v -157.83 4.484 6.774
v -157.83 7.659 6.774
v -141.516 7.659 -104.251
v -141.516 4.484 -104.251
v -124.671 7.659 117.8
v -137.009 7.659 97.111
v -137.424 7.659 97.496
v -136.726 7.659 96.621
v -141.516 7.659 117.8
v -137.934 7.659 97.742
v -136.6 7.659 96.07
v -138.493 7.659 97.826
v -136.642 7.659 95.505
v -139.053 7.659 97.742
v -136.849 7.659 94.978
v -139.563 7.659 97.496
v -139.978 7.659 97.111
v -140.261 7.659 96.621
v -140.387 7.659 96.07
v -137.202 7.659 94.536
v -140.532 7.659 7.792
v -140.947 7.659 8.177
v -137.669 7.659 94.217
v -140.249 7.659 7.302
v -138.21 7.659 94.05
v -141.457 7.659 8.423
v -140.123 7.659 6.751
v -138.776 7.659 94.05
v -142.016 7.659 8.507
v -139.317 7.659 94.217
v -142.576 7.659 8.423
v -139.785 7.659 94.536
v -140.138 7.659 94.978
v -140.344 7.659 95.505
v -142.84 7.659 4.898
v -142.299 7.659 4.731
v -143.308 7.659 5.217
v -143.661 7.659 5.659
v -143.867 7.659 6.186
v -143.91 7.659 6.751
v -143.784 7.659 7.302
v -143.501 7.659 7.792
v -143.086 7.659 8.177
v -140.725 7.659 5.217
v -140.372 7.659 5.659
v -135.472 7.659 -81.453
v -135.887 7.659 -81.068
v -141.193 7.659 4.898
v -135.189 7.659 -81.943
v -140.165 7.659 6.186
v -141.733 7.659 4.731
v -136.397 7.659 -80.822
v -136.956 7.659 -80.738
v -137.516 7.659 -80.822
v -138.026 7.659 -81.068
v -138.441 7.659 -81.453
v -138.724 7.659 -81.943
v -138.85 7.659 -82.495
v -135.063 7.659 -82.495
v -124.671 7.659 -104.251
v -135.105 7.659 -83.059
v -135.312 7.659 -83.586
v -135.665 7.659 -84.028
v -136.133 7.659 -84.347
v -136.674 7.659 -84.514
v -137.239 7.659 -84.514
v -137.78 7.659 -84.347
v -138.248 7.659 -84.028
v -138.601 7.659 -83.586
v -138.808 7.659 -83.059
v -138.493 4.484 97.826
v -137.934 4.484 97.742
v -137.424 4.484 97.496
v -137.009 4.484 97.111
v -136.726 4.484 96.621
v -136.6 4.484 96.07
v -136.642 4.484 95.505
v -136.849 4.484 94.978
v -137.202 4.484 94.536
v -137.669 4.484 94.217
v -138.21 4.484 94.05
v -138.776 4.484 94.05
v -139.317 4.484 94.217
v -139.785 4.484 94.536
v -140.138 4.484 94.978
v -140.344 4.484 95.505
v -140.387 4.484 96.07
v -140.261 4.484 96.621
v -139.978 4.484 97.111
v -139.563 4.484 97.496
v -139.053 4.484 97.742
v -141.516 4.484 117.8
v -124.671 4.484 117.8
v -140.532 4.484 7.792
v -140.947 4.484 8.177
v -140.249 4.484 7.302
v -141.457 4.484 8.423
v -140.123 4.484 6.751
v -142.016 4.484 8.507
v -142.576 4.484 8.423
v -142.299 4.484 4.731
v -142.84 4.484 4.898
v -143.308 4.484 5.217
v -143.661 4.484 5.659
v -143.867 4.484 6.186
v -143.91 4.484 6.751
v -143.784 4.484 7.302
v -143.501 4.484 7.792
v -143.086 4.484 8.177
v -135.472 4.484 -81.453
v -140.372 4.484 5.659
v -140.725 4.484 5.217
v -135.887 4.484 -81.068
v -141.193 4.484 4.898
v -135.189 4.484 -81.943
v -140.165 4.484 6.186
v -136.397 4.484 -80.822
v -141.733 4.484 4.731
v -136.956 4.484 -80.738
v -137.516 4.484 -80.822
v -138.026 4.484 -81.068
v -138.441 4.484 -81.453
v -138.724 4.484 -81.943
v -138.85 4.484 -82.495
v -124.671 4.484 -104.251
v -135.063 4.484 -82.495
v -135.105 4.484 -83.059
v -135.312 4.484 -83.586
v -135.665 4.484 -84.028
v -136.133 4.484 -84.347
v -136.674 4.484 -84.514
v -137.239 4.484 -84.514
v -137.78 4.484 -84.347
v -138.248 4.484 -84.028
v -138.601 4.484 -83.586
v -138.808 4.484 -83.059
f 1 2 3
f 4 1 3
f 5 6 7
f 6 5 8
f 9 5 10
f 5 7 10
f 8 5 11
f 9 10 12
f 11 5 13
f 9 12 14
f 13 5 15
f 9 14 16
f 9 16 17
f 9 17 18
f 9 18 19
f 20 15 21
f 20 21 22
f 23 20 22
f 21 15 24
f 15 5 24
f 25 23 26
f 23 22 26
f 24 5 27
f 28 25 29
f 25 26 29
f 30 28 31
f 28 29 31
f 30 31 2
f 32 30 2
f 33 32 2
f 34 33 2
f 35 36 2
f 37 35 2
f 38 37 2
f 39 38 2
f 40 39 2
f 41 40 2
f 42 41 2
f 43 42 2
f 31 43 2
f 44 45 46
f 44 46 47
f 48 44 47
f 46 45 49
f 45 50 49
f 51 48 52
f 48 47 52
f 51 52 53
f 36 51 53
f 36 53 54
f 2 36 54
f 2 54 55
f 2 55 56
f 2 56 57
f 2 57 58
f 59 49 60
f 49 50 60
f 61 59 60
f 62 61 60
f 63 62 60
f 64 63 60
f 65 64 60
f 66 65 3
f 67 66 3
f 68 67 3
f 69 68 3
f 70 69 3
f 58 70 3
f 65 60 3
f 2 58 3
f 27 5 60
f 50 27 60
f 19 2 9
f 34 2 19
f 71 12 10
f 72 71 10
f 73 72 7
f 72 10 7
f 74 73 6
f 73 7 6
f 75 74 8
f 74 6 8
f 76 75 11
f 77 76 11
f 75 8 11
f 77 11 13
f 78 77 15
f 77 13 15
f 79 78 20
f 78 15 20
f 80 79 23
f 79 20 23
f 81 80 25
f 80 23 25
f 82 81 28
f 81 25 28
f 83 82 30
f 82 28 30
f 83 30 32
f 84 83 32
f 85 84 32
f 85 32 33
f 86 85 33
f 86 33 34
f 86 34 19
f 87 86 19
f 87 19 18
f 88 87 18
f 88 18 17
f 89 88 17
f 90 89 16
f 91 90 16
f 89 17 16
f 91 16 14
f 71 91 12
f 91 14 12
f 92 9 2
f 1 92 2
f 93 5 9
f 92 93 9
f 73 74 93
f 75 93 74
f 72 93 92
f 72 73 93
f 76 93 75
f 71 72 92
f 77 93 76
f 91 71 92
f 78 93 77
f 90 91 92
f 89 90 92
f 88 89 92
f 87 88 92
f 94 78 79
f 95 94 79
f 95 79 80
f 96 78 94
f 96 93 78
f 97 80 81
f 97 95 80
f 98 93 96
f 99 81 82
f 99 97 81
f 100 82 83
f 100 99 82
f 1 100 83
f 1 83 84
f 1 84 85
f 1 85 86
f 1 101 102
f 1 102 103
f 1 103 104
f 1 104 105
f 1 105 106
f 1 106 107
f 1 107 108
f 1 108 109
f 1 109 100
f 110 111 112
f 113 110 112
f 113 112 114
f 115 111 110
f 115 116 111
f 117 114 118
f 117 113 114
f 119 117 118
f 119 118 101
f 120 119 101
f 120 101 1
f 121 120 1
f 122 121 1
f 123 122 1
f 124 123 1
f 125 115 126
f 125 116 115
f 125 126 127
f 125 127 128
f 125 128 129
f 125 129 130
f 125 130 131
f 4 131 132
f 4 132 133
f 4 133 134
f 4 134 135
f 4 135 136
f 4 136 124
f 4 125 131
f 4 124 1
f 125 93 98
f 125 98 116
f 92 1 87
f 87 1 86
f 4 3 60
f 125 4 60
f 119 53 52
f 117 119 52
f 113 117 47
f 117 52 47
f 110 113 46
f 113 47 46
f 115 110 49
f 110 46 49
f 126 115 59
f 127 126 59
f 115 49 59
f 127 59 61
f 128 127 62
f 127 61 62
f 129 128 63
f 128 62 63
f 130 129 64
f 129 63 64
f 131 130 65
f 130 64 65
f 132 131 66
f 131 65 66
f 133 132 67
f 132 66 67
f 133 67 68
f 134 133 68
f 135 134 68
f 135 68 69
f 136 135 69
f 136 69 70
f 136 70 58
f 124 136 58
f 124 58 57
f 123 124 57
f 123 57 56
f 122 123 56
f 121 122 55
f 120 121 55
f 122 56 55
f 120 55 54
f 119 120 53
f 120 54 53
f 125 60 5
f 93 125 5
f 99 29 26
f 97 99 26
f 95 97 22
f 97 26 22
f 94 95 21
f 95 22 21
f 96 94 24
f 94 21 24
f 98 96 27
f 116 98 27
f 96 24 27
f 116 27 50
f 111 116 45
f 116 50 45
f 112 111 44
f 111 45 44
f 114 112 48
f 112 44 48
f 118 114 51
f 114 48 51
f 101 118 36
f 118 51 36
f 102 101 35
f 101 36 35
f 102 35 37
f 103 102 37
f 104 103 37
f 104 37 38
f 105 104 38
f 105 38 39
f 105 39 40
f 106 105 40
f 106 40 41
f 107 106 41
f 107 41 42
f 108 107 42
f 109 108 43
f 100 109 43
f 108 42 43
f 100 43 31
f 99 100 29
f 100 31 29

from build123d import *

# Parameters (mm, degrees)
SKETCH1_R      = 1.89865
MAINBODY_DEPTH = 3.175


with BuildPart() as part:
    # Sketch1 → MainBody (new body)
    with BuildSketch(Plane(origin=(0, 7.659460084, 0), x_dir=(1, 0, 0), z_dir=(0, 1, 0))):
        Polygon((-141.5163305, 104.251042847), (-124.67137867, 104.251042847), (-124.67137867, -117.799669373), (-141.5163305, -117.799669373), (-157.82954988, -6.774313263), align=None)
        with Locations(Location((-136.956490805, 82.636522264, 0), (0, 0, 270))):
            Circle(SKETCH1_R, mode=Mode.SUBTRACT)
        with Locations(Location((-142.016337919, -6.608646442, 0), (0, 0, 270))):
            Circle(SKETCH1_R, mode=Mode.SUBTRACT)
        with Locations(Location((-138.493225998, -95.927680655, 0), (0, 0, 270))):
            Circle(SKETCH1_R, mode=Mode.SUBTRACT)
    extrude(amount=-MAINBODY_DEPTH)


solid = part.part
